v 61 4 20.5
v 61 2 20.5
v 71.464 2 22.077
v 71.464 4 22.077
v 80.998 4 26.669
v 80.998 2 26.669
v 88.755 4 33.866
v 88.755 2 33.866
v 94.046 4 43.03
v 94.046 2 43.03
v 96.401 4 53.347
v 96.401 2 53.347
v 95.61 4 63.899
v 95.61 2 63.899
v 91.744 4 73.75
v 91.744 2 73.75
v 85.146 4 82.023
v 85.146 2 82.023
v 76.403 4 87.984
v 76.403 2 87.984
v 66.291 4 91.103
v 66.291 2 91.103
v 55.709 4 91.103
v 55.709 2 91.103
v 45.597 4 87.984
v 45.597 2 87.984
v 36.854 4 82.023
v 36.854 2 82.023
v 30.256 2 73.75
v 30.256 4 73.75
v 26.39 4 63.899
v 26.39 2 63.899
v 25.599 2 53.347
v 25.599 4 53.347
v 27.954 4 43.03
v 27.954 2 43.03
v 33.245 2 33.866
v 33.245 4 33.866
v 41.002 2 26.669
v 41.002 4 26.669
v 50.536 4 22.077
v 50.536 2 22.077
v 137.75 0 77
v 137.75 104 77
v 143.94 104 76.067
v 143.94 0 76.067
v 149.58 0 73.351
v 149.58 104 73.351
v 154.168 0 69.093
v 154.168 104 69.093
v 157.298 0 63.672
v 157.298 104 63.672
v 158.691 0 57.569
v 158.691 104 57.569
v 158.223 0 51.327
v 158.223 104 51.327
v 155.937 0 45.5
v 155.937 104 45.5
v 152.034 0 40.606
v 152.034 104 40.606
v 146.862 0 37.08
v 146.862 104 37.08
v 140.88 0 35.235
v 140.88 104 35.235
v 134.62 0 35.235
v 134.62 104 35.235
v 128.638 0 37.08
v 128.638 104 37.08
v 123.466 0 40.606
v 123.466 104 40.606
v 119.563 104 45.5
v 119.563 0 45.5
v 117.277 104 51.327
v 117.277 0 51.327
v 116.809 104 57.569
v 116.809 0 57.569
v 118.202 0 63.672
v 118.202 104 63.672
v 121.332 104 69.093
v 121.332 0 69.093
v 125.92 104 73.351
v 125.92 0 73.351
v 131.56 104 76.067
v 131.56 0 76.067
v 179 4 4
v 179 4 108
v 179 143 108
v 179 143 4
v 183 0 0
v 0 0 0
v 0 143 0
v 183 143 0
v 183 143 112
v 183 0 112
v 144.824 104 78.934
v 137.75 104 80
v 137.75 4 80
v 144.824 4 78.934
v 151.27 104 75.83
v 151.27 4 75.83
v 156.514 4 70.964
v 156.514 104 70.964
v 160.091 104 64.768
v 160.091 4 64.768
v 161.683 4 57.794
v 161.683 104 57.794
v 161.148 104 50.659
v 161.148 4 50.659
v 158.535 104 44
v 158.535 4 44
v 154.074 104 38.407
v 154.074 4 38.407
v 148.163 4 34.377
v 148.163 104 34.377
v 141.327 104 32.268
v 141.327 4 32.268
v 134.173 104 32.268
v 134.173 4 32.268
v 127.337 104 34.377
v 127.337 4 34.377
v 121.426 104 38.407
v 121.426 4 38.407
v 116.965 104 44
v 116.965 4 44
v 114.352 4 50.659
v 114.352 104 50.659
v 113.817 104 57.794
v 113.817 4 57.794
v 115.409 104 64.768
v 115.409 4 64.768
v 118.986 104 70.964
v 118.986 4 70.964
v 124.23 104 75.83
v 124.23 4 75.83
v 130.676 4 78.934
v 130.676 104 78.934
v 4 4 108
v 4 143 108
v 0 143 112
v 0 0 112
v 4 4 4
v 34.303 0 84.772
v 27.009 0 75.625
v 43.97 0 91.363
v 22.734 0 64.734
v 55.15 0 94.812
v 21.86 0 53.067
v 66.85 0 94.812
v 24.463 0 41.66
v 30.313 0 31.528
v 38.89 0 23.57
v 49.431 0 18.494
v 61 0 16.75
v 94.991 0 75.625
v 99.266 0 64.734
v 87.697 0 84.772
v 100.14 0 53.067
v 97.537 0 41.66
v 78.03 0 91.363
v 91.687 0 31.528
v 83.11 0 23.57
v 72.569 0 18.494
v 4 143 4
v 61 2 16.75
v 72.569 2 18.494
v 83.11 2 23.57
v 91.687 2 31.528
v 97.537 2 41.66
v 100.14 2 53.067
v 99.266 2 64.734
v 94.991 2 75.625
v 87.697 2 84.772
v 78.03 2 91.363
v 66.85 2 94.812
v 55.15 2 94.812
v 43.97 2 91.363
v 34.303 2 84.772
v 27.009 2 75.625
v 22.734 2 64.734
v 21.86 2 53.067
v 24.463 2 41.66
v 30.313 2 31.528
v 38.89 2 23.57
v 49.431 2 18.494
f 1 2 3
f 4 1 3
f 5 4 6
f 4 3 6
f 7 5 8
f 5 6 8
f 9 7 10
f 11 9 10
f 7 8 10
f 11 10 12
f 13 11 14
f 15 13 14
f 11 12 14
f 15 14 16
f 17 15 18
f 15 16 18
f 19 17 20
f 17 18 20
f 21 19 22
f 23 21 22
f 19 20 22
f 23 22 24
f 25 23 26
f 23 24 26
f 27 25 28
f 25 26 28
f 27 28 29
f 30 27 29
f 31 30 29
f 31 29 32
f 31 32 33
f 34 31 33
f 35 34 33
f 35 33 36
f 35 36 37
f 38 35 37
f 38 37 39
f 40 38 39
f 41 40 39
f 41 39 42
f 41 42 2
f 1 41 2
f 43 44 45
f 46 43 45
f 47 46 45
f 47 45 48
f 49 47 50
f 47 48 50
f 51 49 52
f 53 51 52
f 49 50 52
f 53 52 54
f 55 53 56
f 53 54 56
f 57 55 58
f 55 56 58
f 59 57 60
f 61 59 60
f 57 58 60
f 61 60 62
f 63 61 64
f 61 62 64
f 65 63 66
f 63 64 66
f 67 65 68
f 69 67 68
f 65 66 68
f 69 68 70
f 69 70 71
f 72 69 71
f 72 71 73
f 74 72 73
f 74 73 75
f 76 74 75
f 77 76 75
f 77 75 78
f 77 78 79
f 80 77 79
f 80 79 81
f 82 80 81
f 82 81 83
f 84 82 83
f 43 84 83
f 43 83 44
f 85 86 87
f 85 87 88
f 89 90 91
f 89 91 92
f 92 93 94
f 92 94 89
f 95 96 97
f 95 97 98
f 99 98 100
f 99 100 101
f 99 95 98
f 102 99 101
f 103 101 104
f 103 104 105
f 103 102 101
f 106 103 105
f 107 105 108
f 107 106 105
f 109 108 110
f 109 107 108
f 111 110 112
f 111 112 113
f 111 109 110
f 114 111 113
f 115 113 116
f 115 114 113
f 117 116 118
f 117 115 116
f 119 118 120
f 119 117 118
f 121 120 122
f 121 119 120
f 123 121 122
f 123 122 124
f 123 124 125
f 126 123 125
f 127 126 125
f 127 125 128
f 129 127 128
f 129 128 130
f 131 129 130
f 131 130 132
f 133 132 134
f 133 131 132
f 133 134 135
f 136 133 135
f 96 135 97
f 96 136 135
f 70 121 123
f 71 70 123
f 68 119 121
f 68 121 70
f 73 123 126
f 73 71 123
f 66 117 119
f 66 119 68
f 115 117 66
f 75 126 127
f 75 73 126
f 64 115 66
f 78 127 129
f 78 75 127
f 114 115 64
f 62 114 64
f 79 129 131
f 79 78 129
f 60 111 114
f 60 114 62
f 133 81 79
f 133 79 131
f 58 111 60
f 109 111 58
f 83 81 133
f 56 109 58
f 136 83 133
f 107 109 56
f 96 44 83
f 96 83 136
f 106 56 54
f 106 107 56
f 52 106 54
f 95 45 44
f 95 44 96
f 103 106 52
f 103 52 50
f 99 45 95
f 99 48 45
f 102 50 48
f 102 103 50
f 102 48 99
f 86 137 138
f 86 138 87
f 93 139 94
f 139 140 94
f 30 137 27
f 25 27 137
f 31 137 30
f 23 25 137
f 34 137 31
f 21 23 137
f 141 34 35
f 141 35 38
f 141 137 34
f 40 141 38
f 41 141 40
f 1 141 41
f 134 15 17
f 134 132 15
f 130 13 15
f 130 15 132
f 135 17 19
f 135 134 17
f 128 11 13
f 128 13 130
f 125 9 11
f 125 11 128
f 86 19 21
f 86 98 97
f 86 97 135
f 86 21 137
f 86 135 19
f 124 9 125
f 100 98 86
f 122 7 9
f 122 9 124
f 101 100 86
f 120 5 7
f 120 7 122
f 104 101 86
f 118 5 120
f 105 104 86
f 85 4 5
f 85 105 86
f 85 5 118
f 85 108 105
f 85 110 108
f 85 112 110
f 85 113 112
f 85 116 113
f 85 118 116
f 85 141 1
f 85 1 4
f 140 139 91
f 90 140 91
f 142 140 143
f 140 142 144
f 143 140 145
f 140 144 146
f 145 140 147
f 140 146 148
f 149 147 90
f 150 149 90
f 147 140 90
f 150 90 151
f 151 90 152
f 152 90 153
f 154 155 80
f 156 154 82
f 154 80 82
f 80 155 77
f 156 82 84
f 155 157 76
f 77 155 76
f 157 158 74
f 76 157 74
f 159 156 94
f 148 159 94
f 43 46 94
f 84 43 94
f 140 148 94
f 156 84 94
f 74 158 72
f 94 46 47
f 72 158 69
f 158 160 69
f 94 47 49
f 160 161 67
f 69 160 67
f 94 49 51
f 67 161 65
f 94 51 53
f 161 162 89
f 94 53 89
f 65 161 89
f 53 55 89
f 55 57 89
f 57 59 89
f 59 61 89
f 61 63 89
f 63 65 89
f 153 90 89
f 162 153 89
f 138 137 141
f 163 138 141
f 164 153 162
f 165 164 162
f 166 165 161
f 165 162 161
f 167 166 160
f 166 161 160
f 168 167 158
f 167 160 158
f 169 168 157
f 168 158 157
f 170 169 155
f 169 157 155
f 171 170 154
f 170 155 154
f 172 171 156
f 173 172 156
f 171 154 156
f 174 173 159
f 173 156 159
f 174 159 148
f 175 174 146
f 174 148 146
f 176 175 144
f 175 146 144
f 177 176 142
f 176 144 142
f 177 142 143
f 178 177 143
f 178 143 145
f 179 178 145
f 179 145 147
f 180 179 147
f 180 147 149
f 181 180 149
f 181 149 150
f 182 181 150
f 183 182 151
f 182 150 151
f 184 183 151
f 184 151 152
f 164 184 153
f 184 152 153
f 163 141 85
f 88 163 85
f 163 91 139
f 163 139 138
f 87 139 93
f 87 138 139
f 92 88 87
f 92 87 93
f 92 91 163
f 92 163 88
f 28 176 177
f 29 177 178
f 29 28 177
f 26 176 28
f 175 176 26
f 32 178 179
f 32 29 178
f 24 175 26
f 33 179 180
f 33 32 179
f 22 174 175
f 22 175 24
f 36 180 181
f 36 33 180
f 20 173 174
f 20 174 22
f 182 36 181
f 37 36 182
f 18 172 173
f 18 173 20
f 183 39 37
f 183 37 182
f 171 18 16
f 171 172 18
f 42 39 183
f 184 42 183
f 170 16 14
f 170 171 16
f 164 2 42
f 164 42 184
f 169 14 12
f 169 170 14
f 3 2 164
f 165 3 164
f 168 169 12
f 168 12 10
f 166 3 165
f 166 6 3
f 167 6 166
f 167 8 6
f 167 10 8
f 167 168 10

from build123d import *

# Parameters (mm, degrees)
SKETCH1_W           = 183
SKETCH1_H           = 112
BOSS_EXTRUDE1_DEPTH = 4
SKETCH2_W           = 183
SKETCH2_H           = 112
SKETCH2_W_2         = 175
SKETCH2_H_2         = 104
BOSS_EXTRUDE2_DEPTH = 139
SKETCH3_R           = 35.5
CUT_EXTRUDE1_DEPTH  = 4
SKETCH4_R           = 39.25
CUT_EXTRUDE2_DEPTH  = 2
SKETCH5_R           = 21
CUT_EXTRUDE3_DEPTH  = 4
BOSS_EXTRUDE3_START = 100
SKETCH6_R           = 24
SKETCH6_R_2         = 21
BOSS_EXTRUDE3_DEPTH = 100


with BuildPart() as part:
    # Sketch1 → Boss-Extrude1 (new body)
    with BuildSketch(Plane(origin=(0, 0, 0), x_dir=(1, 0, 0), z_dir=(0, 1, 0))):
        with Locations((91.5, -56)):
            Rectangle(SKETCH1_W, SKETCH1_H)
    extrude(amount=BOSS_EXTRUDE1_DEPTH)

    # Sketch2 → Boss-Extrude2 (add)
    with BuildSketch(Plane(origin=(0, 4, 0), x_dir=(1, 0, 0), z_dir=(0, 1, 0))):
        with Locations((91.5, -56)):
            Rectangle(SKETCH2_W, SKETCH2_H)
        with Locations((91.5, -56)):
            Rectangle(SKETCH2_W_2, SKETCH2_H_2, mode=Mode.SUBTRACT)
    extrude(amount=BOSS_EXTRUDE2_DEPTH)

    # Sketch3 → Cut-Extrude1 (cut)
    with BuildSketch(Plane(origin=(0, 0, 0), x_dir=(-1, 0, 0), z_dir=(0, -1, 0))):
        with Locations(Location((-61, -56, 0), (0, 0, 90))):
            Circle(SKETCH3_R)
    extrude(amount=-CUT_EXTRUDE1_DEPTH, mode=Mode.SUBTRACT)

    # Sketch4 → Cut-Extrude2 (cut)
    with BuildSketch(Plane(origin=(0, 0, 0), x_dir=(-1, 0, 0), z_dir=(0, -1, 0))):
        with Locations(Location((-61, -56, 0), (0, 0, 90))):
            Circle(SKETCH4_R)
    extrude(amount=-CUT_EXTRUDE2_DEPTH, mode=Mode.SUBTRACT)

    # Sketch5 → Cut-Extrude3 (cut)
    with BuildSketch(Plane(origin=(0, 4, 0), x_dir=(1, 0, 0), z_dir=(0, 1, 0))):
        with Locations(Location((137.75, -56, 0), (0, 0, 270))):
            Circle(SKETCH5_R)
    extrude(amount=-CUT_EXTRUDE3_DEPTH, mode=Mode.SUBTRACT)

    # Sketch6 → Boss-Extrude3 (add)
    with BuildSketch(Plane(origin=(0, 4, 0), x_dir=(1, 0, 0), z_dir=(0, 1, 0)).offset(BOSS_EXTRUDE3_START)):
        with Locations(Location((137.75, -56, 0), (0, 0, 270))):
            Circle(SKETCH6_R)
        with Locations(Location((137.75, -56, 0), (0, 0, 270))):
            Circle(SKETCH6_R_2, mode=Mode.SUBTRACT)
    extrude(amount=-BOSS_EXTRUDE3_DEPTH)


solid = part.part
